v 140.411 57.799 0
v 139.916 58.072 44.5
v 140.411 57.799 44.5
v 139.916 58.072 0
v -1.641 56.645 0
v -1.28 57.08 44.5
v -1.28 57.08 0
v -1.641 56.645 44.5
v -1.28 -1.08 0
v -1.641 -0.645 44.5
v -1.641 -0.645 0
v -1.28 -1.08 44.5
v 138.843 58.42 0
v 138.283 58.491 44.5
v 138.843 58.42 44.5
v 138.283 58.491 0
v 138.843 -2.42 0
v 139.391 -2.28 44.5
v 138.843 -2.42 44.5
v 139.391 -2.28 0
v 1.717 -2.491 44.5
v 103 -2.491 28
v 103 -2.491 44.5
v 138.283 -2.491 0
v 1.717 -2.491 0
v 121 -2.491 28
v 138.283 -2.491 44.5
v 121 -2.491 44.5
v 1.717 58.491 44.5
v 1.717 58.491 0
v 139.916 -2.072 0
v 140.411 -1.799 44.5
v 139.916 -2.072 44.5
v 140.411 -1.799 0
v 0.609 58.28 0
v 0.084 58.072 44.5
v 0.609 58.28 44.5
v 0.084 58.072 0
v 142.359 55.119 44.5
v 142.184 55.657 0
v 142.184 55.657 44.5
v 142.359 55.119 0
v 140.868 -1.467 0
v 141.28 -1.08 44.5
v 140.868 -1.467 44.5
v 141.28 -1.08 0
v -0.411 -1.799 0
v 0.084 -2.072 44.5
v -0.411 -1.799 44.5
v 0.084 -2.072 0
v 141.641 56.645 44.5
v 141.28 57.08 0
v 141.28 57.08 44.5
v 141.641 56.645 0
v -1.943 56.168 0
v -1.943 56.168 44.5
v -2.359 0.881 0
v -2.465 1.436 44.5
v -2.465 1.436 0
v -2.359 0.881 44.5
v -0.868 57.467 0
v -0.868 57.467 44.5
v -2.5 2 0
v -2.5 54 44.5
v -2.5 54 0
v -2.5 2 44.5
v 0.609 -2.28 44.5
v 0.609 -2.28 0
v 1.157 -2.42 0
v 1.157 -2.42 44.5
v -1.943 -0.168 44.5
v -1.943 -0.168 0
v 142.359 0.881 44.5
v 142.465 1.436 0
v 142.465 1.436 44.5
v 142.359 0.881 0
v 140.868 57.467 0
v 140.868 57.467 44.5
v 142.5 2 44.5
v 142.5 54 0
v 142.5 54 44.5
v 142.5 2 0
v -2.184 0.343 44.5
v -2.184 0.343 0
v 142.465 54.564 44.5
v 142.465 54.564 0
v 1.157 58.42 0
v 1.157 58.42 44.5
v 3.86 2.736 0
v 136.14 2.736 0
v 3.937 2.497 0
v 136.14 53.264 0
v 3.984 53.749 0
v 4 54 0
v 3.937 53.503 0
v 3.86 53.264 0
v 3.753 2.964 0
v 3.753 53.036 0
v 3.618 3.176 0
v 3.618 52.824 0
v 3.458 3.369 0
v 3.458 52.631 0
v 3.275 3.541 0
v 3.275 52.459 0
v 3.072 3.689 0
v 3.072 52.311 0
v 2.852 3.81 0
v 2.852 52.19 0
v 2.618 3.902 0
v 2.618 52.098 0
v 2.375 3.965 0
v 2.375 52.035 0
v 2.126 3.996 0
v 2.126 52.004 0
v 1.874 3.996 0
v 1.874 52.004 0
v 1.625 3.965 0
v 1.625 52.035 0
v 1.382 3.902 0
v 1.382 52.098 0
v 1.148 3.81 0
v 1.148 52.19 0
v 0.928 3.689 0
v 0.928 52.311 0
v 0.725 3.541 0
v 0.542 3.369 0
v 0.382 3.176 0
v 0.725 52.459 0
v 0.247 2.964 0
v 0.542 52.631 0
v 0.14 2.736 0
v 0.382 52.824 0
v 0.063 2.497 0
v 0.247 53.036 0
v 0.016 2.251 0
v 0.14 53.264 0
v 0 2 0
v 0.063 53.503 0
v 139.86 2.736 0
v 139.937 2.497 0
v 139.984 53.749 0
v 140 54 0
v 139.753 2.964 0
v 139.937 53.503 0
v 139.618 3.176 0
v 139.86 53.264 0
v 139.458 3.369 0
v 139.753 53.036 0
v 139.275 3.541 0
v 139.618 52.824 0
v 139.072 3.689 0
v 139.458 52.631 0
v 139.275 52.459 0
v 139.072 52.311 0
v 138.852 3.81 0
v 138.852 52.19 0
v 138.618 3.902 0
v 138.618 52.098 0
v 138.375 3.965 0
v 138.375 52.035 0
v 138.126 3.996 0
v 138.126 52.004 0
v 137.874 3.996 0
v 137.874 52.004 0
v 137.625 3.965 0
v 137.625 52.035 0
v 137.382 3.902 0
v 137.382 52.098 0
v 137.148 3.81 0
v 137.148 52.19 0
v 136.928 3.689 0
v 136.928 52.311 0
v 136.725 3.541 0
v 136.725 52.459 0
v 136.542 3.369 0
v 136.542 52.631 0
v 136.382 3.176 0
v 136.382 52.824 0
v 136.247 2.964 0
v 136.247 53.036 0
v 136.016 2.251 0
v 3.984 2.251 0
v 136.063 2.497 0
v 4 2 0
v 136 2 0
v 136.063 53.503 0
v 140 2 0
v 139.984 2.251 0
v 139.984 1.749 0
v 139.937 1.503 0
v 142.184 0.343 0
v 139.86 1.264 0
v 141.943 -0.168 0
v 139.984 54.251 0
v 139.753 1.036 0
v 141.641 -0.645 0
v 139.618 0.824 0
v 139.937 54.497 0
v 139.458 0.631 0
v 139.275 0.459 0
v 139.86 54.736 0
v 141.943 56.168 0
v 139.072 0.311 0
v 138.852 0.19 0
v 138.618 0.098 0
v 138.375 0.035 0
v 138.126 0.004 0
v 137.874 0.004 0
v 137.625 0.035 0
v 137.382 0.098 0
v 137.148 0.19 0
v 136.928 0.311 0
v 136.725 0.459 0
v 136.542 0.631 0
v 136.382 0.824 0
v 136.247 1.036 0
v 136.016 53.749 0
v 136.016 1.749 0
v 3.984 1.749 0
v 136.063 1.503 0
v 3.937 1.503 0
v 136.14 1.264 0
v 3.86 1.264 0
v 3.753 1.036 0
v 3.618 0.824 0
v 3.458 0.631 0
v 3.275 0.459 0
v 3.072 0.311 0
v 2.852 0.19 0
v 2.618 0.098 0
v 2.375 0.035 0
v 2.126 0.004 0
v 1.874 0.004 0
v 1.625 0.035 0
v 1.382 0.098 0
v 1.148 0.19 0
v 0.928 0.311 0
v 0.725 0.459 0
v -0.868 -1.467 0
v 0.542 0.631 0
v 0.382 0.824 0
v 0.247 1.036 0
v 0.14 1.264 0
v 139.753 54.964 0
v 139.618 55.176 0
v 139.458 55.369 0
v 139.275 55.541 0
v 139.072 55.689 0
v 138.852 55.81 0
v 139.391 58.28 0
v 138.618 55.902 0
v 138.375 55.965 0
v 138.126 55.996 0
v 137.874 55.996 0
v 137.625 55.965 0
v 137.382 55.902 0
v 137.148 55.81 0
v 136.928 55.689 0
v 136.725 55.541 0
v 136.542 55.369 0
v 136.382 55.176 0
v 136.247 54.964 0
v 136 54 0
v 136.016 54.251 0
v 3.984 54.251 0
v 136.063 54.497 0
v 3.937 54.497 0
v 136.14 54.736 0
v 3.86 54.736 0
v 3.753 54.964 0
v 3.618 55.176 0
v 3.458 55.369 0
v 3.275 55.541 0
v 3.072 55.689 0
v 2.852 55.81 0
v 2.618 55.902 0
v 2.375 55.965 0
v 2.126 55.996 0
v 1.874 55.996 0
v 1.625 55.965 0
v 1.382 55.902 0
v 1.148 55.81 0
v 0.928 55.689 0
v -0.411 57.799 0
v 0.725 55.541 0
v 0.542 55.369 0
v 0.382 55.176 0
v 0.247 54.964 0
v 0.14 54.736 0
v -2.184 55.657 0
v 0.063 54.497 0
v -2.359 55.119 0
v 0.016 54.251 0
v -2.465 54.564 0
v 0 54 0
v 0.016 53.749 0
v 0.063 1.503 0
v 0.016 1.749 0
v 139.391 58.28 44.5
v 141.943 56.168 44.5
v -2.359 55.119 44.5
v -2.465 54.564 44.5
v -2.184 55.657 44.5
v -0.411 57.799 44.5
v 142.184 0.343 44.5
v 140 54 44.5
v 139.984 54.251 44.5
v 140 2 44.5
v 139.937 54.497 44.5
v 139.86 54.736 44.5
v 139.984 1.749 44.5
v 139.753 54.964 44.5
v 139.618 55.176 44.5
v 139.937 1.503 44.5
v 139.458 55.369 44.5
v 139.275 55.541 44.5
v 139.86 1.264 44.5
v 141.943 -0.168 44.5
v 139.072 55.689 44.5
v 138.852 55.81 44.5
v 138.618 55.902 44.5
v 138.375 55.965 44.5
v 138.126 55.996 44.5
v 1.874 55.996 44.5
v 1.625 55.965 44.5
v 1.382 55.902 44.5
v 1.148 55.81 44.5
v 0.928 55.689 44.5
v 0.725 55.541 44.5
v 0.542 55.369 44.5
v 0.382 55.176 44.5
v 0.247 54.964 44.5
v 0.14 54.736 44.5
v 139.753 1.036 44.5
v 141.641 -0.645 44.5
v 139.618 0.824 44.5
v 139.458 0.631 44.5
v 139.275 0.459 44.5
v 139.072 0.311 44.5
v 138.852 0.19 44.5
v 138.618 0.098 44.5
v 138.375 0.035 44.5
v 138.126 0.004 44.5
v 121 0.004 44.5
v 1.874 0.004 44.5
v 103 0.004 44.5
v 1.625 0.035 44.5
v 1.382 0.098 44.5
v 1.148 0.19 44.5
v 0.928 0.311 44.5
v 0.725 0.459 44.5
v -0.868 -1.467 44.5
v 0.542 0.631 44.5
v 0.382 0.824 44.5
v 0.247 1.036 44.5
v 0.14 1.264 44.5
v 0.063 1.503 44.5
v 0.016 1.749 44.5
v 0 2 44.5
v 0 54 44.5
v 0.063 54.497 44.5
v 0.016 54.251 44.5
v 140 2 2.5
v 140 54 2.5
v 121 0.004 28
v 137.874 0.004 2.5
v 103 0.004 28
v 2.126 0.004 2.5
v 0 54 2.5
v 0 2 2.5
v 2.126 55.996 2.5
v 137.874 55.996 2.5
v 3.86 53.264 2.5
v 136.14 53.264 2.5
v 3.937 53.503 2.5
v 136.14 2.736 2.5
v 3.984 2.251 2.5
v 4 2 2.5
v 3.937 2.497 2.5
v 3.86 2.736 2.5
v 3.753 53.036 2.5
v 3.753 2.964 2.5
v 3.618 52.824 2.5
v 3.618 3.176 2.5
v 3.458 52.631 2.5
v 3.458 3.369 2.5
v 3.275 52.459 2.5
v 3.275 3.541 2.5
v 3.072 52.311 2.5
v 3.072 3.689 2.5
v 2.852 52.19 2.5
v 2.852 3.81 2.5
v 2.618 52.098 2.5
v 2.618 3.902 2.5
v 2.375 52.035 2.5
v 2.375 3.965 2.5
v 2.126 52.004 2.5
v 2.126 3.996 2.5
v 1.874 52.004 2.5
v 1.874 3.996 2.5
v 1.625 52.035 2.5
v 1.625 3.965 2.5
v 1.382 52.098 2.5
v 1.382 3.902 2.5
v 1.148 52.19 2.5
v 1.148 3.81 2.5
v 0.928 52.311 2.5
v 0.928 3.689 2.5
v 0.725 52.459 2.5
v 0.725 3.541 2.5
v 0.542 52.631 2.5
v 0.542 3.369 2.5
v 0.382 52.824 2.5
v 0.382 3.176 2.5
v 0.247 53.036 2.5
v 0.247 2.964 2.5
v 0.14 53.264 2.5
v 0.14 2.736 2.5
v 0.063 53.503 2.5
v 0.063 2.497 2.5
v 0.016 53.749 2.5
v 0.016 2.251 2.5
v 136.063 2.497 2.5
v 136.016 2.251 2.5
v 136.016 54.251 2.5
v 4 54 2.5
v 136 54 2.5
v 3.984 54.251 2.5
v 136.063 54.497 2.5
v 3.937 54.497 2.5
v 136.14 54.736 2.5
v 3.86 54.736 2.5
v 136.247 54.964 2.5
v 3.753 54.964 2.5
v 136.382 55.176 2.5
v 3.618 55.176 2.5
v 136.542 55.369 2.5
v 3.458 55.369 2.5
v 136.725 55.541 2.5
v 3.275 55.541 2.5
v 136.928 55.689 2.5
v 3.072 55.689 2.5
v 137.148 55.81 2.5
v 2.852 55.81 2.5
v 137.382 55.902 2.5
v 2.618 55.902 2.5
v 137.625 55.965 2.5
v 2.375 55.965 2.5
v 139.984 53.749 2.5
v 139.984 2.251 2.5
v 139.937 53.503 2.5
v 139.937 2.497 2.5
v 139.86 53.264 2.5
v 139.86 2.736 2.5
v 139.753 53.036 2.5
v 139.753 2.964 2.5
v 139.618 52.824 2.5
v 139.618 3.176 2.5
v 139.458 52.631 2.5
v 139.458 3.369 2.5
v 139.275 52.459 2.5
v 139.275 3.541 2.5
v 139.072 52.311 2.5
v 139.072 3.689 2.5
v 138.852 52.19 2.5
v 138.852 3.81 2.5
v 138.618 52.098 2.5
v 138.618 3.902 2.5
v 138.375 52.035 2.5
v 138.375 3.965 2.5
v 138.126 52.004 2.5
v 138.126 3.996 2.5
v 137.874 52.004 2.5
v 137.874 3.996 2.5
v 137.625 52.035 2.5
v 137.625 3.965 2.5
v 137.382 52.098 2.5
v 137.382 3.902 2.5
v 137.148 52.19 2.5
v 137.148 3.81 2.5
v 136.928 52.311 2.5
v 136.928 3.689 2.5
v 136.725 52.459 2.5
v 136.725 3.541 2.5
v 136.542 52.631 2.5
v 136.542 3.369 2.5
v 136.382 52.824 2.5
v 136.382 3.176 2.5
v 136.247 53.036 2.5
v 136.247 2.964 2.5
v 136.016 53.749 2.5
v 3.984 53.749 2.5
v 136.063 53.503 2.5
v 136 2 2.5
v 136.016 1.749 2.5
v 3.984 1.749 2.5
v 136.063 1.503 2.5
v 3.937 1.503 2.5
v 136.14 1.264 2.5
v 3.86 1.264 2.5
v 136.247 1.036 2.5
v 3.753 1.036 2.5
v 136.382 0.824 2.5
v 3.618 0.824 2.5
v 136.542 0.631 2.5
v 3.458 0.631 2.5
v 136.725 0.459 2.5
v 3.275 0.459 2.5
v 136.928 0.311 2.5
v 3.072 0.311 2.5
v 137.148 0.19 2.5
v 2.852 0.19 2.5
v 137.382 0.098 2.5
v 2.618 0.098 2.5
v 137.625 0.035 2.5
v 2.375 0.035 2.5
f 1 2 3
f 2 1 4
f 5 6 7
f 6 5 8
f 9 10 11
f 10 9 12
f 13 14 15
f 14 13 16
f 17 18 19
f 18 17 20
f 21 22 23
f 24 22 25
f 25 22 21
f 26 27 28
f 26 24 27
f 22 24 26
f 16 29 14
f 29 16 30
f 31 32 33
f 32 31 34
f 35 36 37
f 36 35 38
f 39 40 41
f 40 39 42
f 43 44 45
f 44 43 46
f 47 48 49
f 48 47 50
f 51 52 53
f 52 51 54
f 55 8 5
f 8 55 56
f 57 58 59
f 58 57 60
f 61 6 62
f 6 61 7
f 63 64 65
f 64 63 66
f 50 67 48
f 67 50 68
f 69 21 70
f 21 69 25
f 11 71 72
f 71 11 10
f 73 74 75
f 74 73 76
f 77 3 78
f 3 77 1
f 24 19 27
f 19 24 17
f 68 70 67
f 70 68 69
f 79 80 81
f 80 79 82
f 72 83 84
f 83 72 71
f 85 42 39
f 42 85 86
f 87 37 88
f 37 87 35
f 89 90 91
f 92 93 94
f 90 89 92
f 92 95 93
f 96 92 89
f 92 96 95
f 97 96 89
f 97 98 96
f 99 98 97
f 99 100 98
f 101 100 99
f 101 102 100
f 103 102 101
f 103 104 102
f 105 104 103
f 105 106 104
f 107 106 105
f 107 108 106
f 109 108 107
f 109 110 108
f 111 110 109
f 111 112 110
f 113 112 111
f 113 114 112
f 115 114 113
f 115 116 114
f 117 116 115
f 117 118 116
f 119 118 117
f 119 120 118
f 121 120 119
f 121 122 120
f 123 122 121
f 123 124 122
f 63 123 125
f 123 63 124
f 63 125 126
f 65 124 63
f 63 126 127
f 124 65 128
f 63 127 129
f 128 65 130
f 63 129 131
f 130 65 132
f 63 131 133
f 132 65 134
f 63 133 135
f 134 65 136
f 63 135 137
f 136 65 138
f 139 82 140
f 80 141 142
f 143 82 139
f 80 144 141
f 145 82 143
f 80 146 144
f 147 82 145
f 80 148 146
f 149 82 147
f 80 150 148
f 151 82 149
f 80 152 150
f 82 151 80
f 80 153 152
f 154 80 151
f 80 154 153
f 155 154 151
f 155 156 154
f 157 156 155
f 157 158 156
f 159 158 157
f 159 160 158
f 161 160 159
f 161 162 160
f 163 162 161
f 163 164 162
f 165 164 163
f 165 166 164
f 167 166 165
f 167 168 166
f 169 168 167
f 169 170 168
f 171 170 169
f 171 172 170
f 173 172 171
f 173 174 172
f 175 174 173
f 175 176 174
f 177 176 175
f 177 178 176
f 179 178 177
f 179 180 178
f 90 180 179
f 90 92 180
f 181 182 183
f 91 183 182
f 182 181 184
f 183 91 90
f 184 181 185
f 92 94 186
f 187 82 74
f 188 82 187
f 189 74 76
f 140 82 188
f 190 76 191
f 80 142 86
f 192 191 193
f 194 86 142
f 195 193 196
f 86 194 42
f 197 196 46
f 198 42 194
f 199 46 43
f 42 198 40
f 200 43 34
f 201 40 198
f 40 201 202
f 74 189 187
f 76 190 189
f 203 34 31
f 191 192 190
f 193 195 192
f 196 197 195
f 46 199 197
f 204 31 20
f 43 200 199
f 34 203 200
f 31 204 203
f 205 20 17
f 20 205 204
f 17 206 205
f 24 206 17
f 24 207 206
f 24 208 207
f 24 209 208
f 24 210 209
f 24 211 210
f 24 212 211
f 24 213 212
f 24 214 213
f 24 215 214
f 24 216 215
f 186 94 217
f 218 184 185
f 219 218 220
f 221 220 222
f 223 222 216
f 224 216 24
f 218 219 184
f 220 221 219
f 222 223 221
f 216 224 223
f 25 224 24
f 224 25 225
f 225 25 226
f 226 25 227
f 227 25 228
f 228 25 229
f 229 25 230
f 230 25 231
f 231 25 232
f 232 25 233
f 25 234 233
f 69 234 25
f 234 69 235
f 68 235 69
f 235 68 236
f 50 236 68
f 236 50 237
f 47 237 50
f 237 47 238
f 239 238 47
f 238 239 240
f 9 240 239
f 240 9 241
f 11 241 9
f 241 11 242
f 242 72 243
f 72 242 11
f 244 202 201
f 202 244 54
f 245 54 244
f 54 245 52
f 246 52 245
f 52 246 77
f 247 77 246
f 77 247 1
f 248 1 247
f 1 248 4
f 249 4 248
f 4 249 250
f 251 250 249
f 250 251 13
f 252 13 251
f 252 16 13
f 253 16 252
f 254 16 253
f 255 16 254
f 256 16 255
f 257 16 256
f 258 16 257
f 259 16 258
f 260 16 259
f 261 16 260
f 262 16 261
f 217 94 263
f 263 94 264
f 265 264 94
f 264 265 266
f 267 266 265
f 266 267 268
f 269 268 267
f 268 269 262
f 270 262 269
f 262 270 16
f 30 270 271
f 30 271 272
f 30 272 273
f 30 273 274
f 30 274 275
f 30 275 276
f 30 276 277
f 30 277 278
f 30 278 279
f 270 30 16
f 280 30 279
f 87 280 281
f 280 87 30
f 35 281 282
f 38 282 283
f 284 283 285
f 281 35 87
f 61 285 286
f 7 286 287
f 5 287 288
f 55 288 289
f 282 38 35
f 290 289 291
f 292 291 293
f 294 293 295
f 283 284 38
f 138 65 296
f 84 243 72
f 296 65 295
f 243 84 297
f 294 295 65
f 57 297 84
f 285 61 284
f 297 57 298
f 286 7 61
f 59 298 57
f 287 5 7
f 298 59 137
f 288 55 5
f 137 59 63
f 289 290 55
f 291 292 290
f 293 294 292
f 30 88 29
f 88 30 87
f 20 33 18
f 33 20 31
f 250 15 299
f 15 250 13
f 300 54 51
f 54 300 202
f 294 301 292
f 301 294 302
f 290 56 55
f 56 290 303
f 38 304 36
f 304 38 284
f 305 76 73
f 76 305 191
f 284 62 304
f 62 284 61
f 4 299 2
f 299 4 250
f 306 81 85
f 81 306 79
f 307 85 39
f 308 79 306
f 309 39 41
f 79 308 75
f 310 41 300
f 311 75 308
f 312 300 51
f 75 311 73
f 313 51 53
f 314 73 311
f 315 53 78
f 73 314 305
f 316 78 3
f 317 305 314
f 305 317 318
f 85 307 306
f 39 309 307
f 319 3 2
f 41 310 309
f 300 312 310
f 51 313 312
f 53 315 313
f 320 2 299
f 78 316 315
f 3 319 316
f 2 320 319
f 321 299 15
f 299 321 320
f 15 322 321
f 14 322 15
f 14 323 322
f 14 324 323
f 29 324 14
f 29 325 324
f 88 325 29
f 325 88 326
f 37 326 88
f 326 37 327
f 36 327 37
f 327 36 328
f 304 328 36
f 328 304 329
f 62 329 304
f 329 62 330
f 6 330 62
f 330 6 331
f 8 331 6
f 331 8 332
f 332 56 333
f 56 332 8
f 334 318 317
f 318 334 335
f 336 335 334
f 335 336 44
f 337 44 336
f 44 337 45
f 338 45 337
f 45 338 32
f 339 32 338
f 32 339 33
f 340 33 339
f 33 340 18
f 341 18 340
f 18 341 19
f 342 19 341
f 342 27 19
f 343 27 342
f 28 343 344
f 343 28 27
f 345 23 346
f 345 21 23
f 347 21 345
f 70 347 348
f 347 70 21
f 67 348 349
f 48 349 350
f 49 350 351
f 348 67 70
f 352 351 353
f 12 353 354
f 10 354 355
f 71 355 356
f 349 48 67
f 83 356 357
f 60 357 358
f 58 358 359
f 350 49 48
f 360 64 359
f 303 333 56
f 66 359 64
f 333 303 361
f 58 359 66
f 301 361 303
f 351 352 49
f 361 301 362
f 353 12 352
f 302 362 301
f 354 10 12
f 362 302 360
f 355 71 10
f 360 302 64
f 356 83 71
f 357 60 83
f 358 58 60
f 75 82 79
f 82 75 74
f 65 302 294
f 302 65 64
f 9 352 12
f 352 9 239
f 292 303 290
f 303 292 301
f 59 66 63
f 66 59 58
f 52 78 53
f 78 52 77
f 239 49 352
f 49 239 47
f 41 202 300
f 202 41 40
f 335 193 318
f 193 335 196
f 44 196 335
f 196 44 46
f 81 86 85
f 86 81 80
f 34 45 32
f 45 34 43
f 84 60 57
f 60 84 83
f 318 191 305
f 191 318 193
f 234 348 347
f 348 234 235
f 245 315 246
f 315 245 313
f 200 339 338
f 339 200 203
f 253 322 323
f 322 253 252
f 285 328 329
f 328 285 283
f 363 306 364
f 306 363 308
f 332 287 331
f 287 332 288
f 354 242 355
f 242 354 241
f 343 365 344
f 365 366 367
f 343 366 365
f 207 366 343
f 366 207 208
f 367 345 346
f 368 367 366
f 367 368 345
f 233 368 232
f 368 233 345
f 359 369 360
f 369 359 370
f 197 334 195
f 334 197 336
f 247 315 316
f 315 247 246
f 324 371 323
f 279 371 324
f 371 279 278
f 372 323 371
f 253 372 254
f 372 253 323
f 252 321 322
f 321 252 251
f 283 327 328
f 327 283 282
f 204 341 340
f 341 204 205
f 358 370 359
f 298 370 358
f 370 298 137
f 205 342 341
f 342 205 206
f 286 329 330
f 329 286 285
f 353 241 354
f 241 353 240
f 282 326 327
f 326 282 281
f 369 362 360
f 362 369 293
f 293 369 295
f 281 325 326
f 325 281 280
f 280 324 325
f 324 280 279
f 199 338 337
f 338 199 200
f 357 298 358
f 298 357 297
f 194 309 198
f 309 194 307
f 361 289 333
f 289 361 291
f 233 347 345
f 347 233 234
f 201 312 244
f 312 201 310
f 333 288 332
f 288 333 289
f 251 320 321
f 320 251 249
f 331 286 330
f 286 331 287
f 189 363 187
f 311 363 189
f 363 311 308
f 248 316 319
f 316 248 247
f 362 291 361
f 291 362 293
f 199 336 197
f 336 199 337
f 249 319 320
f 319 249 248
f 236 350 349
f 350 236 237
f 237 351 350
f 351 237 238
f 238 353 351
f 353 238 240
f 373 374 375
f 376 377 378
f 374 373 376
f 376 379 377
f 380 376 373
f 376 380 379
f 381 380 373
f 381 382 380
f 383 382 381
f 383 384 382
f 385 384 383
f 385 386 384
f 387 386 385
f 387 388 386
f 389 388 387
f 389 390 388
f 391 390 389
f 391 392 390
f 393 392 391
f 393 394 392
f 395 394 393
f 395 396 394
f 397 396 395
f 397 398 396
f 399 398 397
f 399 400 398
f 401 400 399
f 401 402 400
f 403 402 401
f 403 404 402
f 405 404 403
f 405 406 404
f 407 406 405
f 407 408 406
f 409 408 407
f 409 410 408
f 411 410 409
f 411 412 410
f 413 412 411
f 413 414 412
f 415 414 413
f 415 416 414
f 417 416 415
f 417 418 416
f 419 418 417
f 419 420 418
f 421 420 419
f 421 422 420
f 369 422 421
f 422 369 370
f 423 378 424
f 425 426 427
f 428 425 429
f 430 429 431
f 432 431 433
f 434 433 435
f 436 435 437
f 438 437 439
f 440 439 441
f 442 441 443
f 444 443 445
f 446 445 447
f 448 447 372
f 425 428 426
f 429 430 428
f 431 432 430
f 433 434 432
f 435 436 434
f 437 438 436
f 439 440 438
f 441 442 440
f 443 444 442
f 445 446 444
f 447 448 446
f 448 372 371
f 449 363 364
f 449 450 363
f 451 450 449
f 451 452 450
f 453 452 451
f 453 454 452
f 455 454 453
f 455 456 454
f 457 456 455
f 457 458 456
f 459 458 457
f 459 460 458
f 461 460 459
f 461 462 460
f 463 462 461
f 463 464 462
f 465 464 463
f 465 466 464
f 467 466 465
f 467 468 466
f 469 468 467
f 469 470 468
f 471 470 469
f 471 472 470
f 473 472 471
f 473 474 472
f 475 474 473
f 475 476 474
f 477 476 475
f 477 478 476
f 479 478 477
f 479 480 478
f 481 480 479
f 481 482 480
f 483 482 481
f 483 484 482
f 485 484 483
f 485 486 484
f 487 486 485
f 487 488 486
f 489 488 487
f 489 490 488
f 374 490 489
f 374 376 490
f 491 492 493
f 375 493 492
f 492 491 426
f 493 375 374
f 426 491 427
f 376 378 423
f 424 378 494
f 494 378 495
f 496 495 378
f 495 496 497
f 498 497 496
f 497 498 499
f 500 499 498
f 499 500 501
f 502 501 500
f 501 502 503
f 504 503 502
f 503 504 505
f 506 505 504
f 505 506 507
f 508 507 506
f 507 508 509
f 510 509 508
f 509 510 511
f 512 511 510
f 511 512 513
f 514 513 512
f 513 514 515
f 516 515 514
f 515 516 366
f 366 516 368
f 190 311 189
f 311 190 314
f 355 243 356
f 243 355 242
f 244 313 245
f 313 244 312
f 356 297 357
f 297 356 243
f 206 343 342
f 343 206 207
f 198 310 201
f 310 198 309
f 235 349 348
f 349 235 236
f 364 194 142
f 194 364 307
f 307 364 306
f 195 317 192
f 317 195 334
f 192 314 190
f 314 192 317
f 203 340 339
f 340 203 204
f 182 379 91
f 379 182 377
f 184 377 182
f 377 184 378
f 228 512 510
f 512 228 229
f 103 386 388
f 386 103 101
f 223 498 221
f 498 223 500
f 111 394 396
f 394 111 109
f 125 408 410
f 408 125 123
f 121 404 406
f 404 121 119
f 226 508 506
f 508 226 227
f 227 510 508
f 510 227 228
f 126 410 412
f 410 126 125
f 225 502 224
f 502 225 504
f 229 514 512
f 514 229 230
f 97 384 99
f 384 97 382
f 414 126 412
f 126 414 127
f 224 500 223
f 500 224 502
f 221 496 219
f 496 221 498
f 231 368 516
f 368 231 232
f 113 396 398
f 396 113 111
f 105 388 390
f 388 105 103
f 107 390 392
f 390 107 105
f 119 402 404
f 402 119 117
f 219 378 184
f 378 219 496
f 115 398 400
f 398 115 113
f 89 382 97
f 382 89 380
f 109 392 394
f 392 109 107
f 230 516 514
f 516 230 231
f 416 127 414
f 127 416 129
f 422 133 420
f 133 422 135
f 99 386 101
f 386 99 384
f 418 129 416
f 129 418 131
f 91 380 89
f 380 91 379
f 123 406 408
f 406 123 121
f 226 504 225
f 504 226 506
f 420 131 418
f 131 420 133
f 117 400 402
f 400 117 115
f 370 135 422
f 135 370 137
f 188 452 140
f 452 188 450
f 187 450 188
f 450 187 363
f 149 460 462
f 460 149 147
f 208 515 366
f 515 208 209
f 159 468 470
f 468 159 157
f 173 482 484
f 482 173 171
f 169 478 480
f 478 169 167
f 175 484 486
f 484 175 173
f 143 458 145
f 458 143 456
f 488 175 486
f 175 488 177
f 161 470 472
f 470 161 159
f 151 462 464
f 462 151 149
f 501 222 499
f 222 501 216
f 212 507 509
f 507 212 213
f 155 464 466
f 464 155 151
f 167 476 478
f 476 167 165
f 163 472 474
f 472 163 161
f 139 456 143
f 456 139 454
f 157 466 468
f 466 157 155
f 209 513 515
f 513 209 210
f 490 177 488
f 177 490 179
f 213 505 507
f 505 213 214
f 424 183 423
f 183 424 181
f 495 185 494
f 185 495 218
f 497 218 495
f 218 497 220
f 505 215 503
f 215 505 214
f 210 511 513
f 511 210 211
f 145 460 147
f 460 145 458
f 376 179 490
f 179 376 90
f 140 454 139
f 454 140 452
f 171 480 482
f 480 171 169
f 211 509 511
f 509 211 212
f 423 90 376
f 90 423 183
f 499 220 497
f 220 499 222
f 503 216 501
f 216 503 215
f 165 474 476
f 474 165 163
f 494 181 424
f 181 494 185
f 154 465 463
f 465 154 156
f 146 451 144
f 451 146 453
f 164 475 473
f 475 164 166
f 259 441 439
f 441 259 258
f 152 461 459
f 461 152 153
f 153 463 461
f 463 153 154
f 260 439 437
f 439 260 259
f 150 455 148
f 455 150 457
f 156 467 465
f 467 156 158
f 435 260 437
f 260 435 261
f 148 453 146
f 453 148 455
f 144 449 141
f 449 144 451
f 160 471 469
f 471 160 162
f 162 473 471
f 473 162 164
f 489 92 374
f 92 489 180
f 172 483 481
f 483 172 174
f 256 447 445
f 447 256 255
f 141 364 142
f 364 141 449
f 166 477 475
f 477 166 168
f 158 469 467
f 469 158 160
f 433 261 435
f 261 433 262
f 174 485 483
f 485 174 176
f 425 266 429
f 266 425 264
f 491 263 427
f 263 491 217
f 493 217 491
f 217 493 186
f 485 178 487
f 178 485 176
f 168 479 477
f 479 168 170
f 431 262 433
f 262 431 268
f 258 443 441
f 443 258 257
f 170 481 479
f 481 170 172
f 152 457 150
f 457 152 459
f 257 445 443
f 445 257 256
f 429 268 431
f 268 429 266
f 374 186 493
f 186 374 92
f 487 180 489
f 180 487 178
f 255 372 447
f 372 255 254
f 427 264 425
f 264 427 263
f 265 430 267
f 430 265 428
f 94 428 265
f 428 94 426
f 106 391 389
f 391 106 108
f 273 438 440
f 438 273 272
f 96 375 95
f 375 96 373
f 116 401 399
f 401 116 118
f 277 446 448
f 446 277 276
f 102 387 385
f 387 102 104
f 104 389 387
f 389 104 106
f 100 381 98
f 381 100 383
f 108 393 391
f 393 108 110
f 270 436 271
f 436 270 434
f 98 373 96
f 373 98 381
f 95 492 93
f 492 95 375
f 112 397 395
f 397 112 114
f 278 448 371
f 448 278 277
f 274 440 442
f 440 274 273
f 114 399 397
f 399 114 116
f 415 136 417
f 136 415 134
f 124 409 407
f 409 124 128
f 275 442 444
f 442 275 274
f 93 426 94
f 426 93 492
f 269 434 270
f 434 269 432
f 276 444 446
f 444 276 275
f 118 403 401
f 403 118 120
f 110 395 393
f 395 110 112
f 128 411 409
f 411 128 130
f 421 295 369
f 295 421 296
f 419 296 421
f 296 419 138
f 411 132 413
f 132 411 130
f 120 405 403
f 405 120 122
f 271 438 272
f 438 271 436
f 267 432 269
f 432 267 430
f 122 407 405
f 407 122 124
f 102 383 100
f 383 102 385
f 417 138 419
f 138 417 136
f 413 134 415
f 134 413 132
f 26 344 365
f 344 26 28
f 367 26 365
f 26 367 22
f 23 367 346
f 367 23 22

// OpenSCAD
$fn = 50;
wall = 2.5; 
radius = 2;
height = 42;
width = 140;
depth = 56; 

difference(){
union(){
difference(){
    hull(){
        translate([radius,radius,0])cylinder(r=radius+wall,h = height+wall);
        translate([width-radius,radius,0])cylinder(r=radius+wall,h = height+wall);
        translate([width-radius,depth-radius,0])cylinder(r=radius+wall,h = height+wall);
        translate([radius,depth-radius,0])cylinder(r=radius+wall,h = height+wall);
    }
    hull(){
        translate([radius,radius,wall])cylinder(r=radius,h = height+wall);
        translate([width-radius,radius,wall])cylinder(r=radius,h= height+wall);
        translate([width-radius,depth-radius,wall])cylinder(r=radius,h = height+wall);
        translate([radius,depth-radius,wall])cylinder(r=radius,h = height+wall);  
    }  
}
// the standof
//        translate([radius,radius,wall])cylinder(r=radius+wall,h = height);
//        translate([width-radius,radius,wall])cylinder(r=radius+wall,h= height);
//        translate([width-radius,depth-radius,wall])cylinder(r=radius+wall,h = height);
//        translate([radius,depth-radius,wall])cylinder(r=radius+wall,h = height); 
}
// and now the holes
//        translate([radius,radius,-0.01])cylinder(r=radius, h= height);
//        translate([width-radius,radius,-0.01])cylinder(r=radius,h= height);
//        translate([width-radius,depth-radius,-0.01])cylinder(r=radius,h = height);
//        translate([radius,depth-radius,-0.01])cylinder(r=radius,h = height); 

        translate([radius,radius,-2])cylinder(d=4, h= height);
        translate([width-radius,radius,-2])cylinder(d=4,h= height);
        translate([width-radius,depth-radius,-2])cylinder(d=4,h = height);
        translate([radius,depth-radius,-2])cylinder(d=4,h = height); 
//
        translate([103,-3,28])cube([18,30,20]);
}
 
